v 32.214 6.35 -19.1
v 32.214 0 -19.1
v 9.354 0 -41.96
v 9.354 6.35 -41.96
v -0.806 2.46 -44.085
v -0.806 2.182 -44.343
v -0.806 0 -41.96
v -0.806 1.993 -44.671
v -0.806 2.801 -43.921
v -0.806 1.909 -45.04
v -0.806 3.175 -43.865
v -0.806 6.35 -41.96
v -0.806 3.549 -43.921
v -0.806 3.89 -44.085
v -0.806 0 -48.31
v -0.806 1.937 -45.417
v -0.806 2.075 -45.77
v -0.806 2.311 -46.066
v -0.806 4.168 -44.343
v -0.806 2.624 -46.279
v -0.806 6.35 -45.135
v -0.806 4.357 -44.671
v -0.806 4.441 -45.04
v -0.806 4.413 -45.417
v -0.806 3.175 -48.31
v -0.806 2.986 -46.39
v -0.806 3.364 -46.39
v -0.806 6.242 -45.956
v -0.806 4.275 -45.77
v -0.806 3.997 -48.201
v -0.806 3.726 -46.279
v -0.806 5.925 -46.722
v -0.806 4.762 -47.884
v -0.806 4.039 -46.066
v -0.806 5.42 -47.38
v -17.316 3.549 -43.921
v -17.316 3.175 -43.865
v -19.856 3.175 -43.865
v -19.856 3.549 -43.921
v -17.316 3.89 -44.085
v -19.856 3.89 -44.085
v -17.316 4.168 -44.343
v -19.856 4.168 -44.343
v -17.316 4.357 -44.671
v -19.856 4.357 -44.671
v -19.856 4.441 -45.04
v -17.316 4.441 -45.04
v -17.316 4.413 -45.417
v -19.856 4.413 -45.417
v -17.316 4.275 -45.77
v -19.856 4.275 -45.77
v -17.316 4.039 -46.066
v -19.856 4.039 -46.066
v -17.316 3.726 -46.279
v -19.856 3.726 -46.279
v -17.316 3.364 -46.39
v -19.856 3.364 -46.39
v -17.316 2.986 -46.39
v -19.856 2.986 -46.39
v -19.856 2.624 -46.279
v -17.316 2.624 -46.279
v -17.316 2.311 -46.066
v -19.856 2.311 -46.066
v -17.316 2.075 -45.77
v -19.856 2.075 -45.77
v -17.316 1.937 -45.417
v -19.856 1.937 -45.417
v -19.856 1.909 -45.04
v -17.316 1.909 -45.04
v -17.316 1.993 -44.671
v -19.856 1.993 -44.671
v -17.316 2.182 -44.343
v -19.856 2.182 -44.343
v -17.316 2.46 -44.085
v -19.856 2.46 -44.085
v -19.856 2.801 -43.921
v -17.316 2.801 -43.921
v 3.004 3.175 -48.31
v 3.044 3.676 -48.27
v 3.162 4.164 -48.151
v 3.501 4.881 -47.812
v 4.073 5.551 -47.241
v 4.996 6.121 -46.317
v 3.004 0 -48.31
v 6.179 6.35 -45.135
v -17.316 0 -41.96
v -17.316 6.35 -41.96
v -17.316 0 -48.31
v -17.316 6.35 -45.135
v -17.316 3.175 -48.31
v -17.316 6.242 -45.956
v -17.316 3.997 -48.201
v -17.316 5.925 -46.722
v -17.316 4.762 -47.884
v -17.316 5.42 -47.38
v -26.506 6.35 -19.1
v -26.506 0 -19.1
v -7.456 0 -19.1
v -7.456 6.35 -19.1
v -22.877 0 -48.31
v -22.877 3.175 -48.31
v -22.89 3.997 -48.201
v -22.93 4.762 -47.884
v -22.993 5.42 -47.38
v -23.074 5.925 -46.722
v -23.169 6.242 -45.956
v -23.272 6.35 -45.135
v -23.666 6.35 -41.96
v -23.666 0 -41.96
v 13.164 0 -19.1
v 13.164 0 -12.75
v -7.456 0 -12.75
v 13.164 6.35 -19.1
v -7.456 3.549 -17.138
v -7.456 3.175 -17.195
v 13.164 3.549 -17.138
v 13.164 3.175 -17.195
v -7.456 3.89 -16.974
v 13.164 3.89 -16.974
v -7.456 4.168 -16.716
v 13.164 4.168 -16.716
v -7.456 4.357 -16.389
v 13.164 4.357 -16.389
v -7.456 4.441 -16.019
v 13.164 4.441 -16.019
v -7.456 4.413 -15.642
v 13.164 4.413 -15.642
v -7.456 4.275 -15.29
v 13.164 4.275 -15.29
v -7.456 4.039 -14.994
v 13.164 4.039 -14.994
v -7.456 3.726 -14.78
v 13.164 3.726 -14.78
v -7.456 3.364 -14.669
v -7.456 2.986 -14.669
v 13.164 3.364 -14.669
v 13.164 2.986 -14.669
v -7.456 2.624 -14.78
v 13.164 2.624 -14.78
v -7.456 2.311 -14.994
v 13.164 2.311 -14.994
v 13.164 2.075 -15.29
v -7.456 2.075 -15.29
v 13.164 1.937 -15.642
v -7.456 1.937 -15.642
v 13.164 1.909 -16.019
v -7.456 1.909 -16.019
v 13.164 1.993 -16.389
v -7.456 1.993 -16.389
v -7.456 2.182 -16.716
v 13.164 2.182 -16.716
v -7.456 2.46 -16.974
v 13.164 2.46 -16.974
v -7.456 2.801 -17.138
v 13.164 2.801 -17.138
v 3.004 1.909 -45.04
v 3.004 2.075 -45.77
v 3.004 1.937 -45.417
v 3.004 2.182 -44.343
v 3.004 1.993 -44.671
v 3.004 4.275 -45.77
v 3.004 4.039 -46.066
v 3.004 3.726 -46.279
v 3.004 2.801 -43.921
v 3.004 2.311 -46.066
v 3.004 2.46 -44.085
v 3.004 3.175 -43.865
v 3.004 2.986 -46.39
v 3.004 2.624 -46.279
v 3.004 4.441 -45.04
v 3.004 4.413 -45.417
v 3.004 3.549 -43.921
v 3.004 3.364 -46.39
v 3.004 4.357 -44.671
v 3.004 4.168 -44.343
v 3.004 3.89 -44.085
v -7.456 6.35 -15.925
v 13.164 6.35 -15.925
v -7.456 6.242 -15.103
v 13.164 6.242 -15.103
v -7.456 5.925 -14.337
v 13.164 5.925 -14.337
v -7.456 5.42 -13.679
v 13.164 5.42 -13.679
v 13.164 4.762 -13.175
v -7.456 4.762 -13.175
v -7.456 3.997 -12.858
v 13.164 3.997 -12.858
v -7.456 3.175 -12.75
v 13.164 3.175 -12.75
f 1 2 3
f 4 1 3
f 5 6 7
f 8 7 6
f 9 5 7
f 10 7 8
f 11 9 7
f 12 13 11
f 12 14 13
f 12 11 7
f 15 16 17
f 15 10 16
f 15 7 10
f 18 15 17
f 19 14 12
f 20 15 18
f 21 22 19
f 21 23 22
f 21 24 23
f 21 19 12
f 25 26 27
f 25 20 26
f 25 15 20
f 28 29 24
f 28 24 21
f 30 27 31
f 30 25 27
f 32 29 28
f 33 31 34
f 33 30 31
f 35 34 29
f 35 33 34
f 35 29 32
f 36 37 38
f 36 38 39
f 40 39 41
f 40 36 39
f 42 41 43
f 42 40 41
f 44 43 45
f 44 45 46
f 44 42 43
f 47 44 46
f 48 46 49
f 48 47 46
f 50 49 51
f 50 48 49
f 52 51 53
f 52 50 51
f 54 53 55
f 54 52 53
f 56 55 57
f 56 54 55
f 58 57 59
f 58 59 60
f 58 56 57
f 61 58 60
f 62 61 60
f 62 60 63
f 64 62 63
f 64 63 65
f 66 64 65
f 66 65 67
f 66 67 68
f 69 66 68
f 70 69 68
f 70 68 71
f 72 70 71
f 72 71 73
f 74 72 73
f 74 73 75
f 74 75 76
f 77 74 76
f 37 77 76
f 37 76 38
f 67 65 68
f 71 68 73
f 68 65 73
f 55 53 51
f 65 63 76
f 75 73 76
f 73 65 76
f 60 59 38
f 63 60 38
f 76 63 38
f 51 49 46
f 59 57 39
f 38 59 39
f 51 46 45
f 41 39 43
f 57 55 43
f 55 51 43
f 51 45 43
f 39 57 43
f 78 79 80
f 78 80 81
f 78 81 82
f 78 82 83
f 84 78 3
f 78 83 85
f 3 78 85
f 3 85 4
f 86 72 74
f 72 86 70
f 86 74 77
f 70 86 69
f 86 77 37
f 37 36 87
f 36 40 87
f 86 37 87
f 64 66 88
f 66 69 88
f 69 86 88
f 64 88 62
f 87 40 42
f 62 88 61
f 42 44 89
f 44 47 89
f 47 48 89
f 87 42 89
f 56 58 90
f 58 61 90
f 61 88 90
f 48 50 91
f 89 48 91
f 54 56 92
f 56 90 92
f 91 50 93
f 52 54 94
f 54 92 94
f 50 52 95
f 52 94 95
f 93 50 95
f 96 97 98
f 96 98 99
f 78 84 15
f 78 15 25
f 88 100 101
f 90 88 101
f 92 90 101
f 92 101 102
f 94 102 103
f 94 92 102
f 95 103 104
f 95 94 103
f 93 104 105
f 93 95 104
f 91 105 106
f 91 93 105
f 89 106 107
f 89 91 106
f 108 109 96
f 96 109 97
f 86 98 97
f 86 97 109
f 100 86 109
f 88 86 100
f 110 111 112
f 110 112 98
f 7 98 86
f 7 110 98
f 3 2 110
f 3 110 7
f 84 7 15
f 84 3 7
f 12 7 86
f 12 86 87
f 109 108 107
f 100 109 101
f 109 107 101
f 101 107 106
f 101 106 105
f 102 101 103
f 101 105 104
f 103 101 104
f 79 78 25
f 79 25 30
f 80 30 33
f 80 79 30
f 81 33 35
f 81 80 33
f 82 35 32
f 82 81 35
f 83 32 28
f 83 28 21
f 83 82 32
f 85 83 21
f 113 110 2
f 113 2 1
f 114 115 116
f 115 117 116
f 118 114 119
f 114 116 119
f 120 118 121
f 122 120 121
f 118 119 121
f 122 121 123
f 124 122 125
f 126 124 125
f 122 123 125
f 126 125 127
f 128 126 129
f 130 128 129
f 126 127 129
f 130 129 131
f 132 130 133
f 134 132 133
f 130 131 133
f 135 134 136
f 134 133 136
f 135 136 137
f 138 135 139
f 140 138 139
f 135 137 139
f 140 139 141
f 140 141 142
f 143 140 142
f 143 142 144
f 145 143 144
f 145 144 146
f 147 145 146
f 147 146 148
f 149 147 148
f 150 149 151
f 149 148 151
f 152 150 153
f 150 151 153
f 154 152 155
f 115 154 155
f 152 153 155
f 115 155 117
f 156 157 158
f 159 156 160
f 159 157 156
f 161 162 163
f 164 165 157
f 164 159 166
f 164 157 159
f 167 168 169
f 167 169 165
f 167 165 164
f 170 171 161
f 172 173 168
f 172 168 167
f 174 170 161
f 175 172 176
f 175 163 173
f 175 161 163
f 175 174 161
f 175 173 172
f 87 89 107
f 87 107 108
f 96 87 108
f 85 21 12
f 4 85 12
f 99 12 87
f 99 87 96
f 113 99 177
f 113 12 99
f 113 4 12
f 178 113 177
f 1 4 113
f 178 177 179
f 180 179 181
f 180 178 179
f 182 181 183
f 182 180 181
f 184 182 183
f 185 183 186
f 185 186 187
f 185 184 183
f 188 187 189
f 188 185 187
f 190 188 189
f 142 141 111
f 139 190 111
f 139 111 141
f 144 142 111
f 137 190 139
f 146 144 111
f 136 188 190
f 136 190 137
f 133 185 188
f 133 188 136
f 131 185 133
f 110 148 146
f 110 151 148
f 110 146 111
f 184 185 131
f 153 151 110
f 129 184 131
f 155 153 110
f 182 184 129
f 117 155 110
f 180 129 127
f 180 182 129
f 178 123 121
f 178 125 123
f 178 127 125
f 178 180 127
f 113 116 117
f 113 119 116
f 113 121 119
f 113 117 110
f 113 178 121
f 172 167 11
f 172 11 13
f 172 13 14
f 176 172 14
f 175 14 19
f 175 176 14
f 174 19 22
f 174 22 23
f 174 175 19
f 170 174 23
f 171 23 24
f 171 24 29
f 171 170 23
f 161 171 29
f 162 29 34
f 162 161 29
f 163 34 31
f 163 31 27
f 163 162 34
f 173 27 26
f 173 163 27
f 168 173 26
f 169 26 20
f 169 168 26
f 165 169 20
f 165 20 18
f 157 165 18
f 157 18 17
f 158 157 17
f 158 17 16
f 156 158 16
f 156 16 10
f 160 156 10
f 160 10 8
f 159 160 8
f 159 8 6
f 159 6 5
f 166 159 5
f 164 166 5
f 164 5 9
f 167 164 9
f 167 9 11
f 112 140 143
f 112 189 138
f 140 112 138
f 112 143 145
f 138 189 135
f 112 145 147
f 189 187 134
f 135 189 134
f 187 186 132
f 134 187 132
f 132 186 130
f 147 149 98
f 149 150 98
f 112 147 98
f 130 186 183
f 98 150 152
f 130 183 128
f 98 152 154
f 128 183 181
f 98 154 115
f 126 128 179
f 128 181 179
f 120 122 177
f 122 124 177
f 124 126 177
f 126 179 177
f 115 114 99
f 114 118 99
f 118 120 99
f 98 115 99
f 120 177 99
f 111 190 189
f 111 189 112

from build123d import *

# Parameters (mm, degrees)
BOSS_EXTRUDE1_DEPTH      = 6.35
SKETCH2_R                = 3.175
SKETCH2_R_2              = 1.27
BOSS_EXTRUDE2_DEPTH      = 32.213991
BOSS_EXTRUDE2_DEPTH_BACK = 26.506426
CUT_EXTRUDE1_START       = 32.213991
SKETCH2_7_R              = 3.175
SKETCH2_7_R_2            = 1.27
CUT_EXTRUDE1_DEPTH       = 19.05
CUT_EXTRUDE2_START       = -26.506426
SKETCH2_8_R              = 3.175
SKETCH2_8_R_2            = 1.27
CUT_EXTRUDE2_DEPTH       = 19.05
BOSS_EXTRUDE3_DEPTH      = 19.05
BOSS_EXTRUDE3_DEPTH_BACK = 24.13
CUT_EXTRUDE3_DEPTH       = 19.05
CUT_EXTRUDE4_START       = 3.81
SKETCH6_R                = 3.175
SKETCH6_R_2              = 1.27
CUT_EXTRUDE4_DEPTH       = 16.51
SKETCH6_4_R              = 1.27
CUT_EXTRUDE5_DEPTH       = 22.86


with BuildPart() as part:
    # Sketch1 → Boss-Extrude1 (new body)
    with BuildSketch(Plane(origin=(0, 0, 0), x_dir=(1, 0, 0), z_dir=(0, 1, 0))):
        Polygon((-26.506426074, 19.099553328), (32.213990648, 19.099553328), (9.353990648, 41.959553328), (-23.666009352, 41.959553328), align=None)
    extrude(amount=BOSS_EXTRUDE1_DEPTH)

    # Sketch2 → Boss-Extrude2 (add, two sides)
    with BuildSketch(Plane(origin=(0, 0, 0), x_dir=(0, 0, -1), z_dir=(1, 0, 0))) as boss_extrude2_sk:
        with BuildLine():
            ThreePointArc((19.099553328, 3.175), (18.169617358, 0.92993597), (15.924553328, 0))
            Line((15.924553328, 0), (19.099553328, 0))
            Line((19.099553328, 0), (19.099553328, 3.175))
        make_face()
        with BuildLine():
            ThreePointArc((15.924553328, 6.35), (18.169617358, 5.42006403), (19.099553328, 3.175))
            Line((19.099553328, 3.175), (19.099553328, 6.35))
            Line((19.099553328, 6.35), (15.924553328, 6.35))
        make_face()
        with Locations((15.924553328, 3.175)):
            Circle(SKETCH2_R)
        with Locations((15.924553328, 3.175)):
            Circle(SKETCH2_R_2, mode=Mode.SUBTRACT)
        with BuildLine():
            Line((12.749553328, 3.175), (12.749553328, 0))
            Line((12.749553328, 0), (15.924553328, 0))
            ThreePointArc((15.924553328, 0), (13.679489298, 0.92993597), (12.749553328, 3.175))
        make_face()
    extrude(amount=BOSS_EXTRUDE2_DEPTH)
    extrude(boss_extrude2_sk.sketch, amount=-BOSS_EXTRUDE2_DEPTH_BACK)

    # Sketch2<7> → Cut-Extrude1 (cut)
    with BuildSketch(Plane(origin=(0, 0, 0), x_dir=(0, 0, -1), z_dir=(1, 0, 0)).offset(CUT_EXTRUDE1_START)):
        with Locations((15.924553328, 3.175)):
            Circle(SKETCH2_7_R)
        with Locations((15.924553328, 3.175)):
            Circle(SKETCH2_7_R_2, mode=Mode.SUBTRACT)
        with BuildLine():
            ThreePointArc((19.099553328, 3.175), (18.169617358, 0.92993597), (15.924553328, 0))
            Line((15.924553328, 0), (19.099553328, 0))
            Line((19.099553328, 0), (19.099553328, 3.175))
        make_face()
        with BuildLine():
            Line((12.749553328, 3.175), (12.749553328, 0))
            Line((12.749553328, 0), (15.924553328, 0))
            ThreePointArc((15.924553328, 0), (13.679489298, 0.92993597), (12.749553328, 3.175))
        make_face()
        with BuildLine():
            ThreePointArc((15.924553328, 6.35), (18.169617358, 5.42006403), (19.099553328, 3.175))
            Line((19.099553328, 3.175), (19.099553328, 6.35))
            Line((19.099553328, 6.35), (15.924553328, 6.35))
        make_face()
    extrude(amount=-CUT_EXTRUDE1_DEPTH, mode=Mode.SUBTRACT)

    # Sketch2<8> → Cut-Extrude2 (cut)
    with BuildSketch(Plane(origin=(0, 0, 0), x_dir=(0, 0, -1), z_dir=(1, 0, 0)).offset(CUT_EXTRUDE2_START)):
        with Locations((15.924553328, 3.175)):
            Circle(SKETCH2_8_R)
        with Locations((15.924553328, 3.175)):
            Circle(SKETCH2_8_R_2, mode=Mode.SUBTRACT)
        with BuildLine():
            ThreePointArc((19.099553328, 3.175), (18.169617358, 0.92993597), (15.924553328, 0))
            Line((15.924553328, 0), (19.099553328, 0))
            Line((19.099553328, 0), (19.099553328, 3.175))
        make_face()
        with BuildLine():
            Line((12.749553328, 3.175), (12.749553328, 0))
            Line((12.749553328, 0), (15.924553328, 0))
            ThreePointArc((15.924553328, 0), (13.679489298, 0.92993597), (12.749553328, 3.175))
        make_face()
        with BuildLine():
            ThreePointArc((15.924553328, 6.35), (18.169617358, 5.42006403), (19.099553328, 3.175))
            Line((19.099553328, 3.175), (19.099553328, 6.35))
            Line((19.099553328, 6.35), (15.924553328, 6.35))
        make_face()
    extrude(amount=CUT_EXTRUDE2_DEPTH, mode=Mode.SUBTRACT)

    # Sketch5 → Boss-Extrude3 (add, two sides)
    with BuildSketch(Plane(origin=(0, 0, 0), x_dir=(0, 0, -1), z_dir=(1, 0, 0))) as boss_extrude3_sk:
        with BuildLine():
            Line((48.309553328, 0), (48.309553328, 3.175))
            ThreePointArc((48.309553328, 3.175), (47.379617358, 5.42006403), (45.134553328, 6.35))
            Line((45.134553328, 6.35), (41.959553328, 6.35))
            Line((41.959553328, 6.35), (41.959553328, 0))
            Line((41.959553328, 0), (48.309553328, 0))
        make_face()
    extrude(amount=BOSS_EXTRUDE3_DEPTH)
    extrude(boss_extrude3_sk.sketch, amount=-BOSS_EXTRUDE3_DEPTH_BACK)

    # Sketch3 → Cut-Extrude3 (cut)
    with BuildSketch(Plane(origin=(0, 6.35, 0), x_dir=(1, 0, 0), z_dir=(0, 1, 0))):
        Polygon((-23.666009352, 41.959553328), (-20.016630387, 71.330174364), (9.353990648, 41.959553328), (25.531438474, 33.85540027), (42.679810996, 71.330174364), (-40.952906467, 76.015398382), (-46.546209233, 30.999855332), align=None)
    extrude(amount=-CUT_EXTRUDE3_DEPTH, mode=Mode.SUBTRACT)

    # Sketch6 → Cut-Extrude4 (cut)
    with BuildSketch(Plane(origin=(3.003990648, 0, 0), x_dir=(0, 1, 0), z_dir=(-1, 0, 0)).offset(CUT_EXTRUDE4_START)):
        with Locations((3.175, 45.134553328)):
            Circle(SKETCH6_R)
        with Locations(Location((3.175, 45.134553328, 0), (0, 0, 270))):
            Circle(SKETCH6_R_2, mode=Mode.SUBTRACT)
        with BuildLine():
            ThreePointArc((3.175, 48.309553328), (5.42006403, 47.379617358), (6.35, 45.134553328))
            Line((6.35, 45.134553328), (6.35, 48.309553328))
            Line((6.35, 48.309553328), (3.175, 48.309553328))
        make_face()
        with BuildLine():
            Line((0, 48.309553328), (0, 45.134553328))
            ThreePointArc((0, 45.134553328), (0.92993597, 47.379617358), (3.175, 48.309553328))
            Line((3.175, 48.309553328), (0, 48.309553328))
        make_face()
        with BuildLine():
            Line((3.175, 41.959553328), (6.35, 41.959553328))
            Line((6.35, 41.959553328), (6.35, 45.134553328))
            ThreePointArc((6.35, 45.134553328), (5.42006403, 42.889489298), (3.175, 41.959553328))
        make_face()
        with BuildLine():
            Line((0, 41.959553328), (3.175, 41.959553328))
            ThreePointArc((3.175, 41.959553328), (0.92993597, 42.889489298), (0, 45.134553328))
            Line((0, 45.134553328), (0, 41.959553328))
        make_face()
    extrude(amount=CUT_EXTRUDE4_DEPTH, mode=Mode.SUBTRACT)

    # Sketch6<4> → Cut-Extrude5 (cut)
    with BuildSketch(Plane(origin=(3.003990648, 0, 0), x_dir=(0, 1, 0), z_dir=(-1, 0, 0))):
        with Locations(Location((3.175, 45.134553328, 0), (0, 0, 270))):
            Circle(SKETCH6_4_R)
    extrude(amount=CUT_EXTRUDE5_DEPTH, mode=Mode.SUBTRACT)


solid = part.part
